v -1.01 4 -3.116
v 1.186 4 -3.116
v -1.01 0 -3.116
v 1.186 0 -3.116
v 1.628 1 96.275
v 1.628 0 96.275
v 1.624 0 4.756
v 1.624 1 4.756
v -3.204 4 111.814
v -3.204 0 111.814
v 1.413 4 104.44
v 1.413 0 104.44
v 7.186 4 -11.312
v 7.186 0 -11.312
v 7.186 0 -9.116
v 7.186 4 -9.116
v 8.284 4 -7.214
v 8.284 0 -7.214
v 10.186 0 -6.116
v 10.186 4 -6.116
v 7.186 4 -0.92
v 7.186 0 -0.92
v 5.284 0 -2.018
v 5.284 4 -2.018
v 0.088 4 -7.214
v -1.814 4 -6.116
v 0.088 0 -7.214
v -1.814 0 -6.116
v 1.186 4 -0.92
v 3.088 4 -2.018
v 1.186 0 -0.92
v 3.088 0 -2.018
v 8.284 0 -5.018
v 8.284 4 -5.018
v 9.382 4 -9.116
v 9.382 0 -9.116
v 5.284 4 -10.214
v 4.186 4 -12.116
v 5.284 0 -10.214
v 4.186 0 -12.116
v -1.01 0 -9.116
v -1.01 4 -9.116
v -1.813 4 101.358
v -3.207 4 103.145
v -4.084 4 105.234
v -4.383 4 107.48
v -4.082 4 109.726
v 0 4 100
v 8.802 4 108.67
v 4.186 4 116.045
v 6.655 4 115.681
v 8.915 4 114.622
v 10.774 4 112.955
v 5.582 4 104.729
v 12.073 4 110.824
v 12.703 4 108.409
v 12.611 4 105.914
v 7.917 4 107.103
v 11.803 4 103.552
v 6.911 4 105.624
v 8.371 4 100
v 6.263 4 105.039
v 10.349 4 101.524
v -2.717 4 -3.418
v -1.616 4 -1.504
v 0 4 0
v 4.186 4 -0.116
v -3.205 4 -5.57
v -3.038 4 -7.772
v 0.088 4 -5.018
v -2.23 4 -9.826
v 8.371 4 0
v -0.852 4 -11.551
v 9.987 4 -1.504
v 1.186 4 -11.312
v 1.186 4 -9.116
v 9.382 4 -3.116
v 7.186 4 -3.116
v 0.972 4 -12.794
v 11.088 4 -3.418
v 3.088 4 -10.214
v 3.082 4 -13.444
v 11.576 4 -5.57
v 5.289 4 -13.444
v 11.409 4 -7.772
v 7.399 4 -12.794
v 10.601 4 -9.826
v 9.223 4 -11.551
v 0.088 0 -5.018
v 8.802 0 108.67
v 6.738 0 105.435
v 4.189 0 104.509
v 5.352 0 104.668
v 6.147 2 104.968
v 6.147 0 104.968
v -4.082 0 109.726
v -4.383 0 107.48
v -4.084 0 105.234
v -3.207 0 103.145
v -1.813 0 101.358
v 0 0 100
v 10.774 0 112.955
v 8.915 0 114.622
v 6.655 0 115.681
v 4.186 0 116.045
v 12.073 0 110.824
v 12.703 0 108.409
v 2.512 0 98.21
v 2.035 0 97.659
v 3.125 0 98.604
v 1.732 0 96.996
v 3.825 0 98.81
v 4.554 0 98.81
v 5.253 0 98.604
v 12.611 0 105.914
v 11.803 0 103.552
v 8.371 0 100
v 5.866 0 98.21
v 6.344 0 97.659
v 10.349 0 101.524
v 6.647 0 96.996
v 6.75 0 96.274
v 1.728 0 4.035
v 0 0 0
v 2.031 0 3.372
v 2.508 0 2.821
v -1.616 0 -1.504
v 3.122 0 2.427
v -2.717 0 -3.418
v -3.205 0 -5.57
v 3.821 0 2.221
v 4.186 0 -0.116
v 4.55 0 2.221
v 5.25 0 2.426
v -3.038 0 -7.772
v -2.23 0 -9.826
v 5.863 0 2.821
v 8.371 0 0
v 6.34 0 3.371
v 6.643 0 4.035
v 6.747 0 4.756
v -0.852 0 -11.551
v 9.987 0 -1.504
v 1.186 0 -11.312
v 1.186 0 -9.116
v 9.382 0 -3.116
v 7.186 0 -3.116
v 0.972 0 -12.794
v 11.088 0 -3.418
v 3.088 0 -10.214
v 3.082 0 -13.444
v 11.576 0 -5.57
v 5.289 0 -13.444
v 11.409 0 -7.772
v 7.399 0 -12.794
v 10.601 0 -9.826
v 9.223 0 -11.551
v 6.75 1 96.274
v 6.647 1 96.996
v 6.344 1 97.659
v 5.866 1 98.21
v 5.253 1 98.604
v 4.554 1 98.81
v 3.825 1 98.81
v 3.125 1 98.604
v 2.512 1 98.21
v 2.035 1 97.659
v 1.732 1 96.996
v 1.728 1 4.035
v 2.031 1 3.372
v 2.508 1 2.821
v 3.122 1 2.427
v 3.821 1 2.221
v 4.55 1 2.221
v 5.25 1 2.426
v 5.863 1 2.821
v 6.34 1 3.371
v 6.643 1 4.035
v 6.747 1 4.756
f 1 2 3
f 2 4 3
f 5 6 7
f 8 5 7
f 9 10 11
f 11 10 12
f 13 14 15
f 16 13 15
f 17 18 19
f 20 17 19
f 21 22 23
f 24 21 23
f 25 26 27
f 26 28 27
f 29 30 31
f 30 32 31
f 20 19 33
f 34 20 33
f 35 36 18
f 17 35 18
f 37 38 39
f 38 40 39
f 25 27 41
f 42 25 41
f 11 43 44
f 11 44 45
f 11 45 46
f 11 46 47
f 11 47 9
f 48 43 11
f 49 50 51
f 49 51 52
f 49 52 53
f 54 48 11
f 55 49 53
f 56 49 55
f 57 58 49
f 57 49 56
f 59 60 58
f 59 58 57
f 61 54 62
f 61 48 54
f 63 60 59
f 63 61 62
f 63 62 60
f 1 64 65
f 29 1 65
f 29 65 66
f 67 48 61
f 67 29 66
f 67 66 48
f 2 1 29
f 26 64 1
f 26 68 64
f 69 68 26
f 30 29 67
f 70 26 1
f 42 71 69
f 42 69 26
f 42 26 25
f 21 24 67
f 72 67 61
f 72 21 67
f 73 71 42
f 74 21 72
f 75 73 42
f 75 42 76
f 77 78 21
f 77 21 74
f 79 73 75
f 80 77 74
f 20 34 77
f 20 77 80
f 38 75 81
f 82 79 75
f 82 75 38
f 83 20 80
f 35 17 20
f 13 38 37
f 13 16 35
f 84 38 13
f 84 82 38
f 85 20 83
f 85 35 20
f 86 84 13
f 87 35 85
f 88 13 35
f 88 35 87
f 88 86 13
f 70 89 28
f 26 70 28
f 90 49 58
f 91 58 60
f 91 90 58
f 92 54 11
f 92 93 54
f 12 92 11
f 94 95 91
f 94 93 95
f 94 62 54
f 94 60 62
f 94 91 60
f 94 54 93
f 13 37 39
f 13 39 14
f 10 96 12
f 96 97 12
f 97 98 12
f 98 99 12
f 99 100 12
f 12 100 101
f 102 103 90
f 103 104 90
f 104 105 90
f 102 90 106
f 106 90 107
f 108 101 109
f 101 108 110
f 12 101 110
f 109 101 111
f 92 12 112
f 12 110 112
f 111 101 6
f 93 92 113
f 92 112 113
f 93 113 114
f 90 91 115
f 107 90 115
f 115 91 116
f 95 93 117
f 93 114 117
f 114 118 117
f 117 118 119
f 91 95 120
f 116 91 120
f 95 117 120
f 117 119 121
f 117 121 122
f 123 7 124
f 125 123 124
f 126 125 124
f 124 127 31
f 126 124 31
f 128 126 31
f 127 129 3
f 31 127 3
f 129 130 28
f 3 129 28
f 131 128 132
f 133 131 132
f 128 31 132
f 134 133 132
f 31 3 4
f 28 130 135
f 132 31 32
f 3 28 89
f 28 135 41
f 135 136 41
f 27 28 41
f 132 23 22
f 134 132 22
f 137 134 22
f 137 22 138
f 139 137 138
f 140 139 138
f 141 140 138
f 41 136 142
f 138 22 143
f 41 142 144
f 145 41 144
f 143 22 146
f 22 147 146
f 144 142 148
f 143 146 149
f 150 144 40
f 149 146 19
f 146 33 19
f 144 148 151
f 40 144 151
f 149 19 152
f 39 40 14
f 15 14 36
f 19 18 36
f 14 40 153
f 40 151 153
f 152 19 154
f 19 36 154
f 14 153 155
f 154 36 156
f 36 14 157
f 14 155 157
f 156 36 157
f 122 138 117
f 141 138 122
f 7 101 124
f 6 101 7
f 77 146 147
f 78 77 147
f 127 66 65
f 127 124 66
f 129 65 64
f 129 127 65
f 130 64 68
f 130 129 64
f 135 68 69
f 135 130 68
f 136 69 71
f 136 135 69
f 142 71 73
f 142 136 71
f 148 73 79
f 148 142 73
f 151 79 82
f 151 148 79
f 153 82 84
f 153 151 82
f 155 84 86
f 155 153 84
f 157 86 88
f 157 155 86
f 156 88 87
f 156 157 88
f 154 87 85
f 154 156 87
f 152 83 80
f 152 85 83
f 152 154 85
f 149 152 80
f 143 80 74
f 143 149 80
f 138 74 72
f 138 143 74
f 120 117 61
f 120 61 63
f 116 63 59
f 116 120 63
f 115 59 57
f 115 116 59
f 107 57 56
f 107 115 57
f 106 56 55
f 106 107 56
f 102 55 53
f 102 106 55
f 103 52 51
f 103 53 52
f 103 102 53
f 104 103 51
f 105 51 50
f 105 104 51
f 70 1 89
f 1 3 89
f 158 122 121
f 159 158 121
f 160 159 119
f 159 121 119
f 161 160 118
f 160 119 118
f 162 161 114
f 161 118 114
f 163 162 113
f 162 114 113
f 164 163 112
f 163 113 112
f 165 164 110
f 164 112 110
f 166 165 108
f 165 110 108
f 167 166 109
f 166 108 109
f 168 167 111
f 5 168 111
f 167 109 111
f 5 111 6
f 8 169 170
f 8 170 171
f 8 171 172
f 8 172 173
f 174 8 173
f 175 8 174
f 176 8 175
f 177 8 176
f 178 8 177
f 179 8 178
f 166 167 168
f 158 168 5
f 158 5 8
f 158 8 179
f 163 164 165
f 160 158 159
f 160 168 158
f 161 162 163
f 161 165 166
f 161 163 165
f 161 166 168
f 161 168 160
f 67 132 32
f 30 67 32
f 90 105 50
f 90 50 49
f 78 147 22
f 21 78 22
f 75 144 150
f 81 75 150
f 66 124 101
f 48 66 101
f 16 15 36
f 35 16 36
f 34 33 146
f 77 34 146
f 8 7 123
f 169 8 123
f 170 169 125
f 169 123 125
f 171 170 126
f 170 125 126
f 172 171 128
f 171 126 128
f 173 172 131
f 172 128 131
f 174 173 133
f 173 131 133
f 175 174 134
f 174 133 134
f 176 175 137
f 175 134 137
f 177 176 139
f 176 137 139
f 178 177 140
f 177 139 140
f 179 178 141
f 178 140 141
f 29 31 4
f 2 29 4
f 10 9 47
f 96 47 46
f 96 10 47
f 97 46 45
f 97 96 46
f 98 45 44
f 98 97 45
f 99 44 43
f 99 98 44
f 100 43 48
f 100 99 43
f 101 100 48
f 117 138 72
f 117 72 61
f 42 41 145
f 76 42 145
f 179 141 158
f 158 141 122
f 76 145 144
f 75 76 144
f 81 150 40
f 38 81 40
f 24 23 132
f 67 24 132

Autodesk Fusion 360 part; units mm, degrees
sketch "Sketch1" plane through (0, 0, 0) normal (0, 1, 0) x (1, 0, 0)
  line L0 (0, 0) -> (0, -100)
  circle A0 centre (4.1857, -107.4765) radius 8.5685
  line L1 (4.1857, -1.3614) -> (4.1857, -1.2953)
  line L2 (8.3714, 0) -> (8.3714, -100)
  arc A1 (8.3714, 0) -> (0, 0) centre (4.1857, 6.1156) ccw
  dimension "d1" = 100
extrude "Extrude1" add sketch "Sketch1" along normal blind 5
sketch "Sketch2" plane through (0, 0, 0) normal (0, -1, 0) x (1, 0, 0)
  arc A0 (0, 0) -> (8.3714, 0) centre (4.1857, -6.1156) ccw
  line L0 (8.3714, 0) -> (8.3714, 100)
  arc A1 (8.3714, 100) -> (0, 100) centre (4.1857, 107.4765) ccw
  line L1 (0, 100) -> (0, 0)
  line L2 (3.0876, -2.0175) -> (1.1857, -0.9195)
  line L3 (7.1857, -0.9195) -> (5.2838, -2.0175)
  line L4 (0.0876, -5.0175) -> (-1.8143, -6.1156)
  line L5 (1.1857, -3.1156) -> (-1.0104, -3.1156)
  line L6 (4.1857, -0.1156) -> (3.0876, -2.0175)
  line L7 (0.0876, -7.2137) -> (-1.0104, -9.1156)
  line L8 (1.1857, -0.9195) -> (1.1857, -3.1156)
  line L9 (1.1857, -9.1156) -> (1.1857, -11.3118)
  line L10 (-1.0104, -3.1156) -> (0.0876, -5.0175)
  line L11 (3.0876, -10.2137) -> (4.1857, -12.1156)
  line L12 (-1.8143, -6.1156) -> (0.0876, -7.2137)
  line L13 (5.2838, -10.2137) -> (7.1857, -11.3118)
  line L14 (-1.0104, -9.1156) -> (1.1857, -9.1156)
  line L15 (7.1857, -9.1156) -> (9.3819, -9.1156)
  line L16 (1.1857, -11.3118) -> (3.0876, -10.2137)
  line L17 (8.2838, -7.2137) -> (10.1857, -6.1156)
  line L18 (4.1857, -12.1156) -> (5.2838, -10.2137)
  line L19 (8.2838, -5.0175) -> (9.3819, -3.1156)
  line L20 (7.1857, -11.3118) -> (7.1857, -9.1156)
  line L21 (7.1857, -3.1156) -> (7.1857, -0.9195)
  line L22 (9.3819, -9.1156) -> (8.2838, -7.2137)
  line L23 (5.2838, -2.0175) -> (4.1857, -0.1156)
  line L24 (10.1857, -6.1156) -> (8.2838, -5.0175)
  line L25 (9.3819, -3.1156) -> (7.1857, -3.1156)
  circle A2 centre (4.1857, 107.4765) radius 8.5685
  line L26 (-3.2037, 111.8142) -> (1.4127, 104.4395)
  line L27 (4.1857, 116.045) -> (8.8021, 108.6703)
  spline S0 degree 2 poles (8.8021, 108.6703) (6.4939, 104.4395) (1.4127, 104.4395) knots 0 0 0 0.931949 0.931949 0.931949 weights 1 3 1
  point P0 (4.1857, -6.1156)
  point P1 (4.1857, -6.1156)
  point P2 (4.1857, -6.1156)
  point P3 (4.1857, -6.1156)
  dimension "d5" = 6
  dimension "d6" = 6
  dimension "d7" = 6
  dimension "d8" = 6
extrude "Extrude2" cut sketch "Sketch2" along normal mid plane 18 contours A1 A2 L26 L27 S0 | L2 L3 L4 L5 L6 L7 L8 L9 L10 L11 L12 L13 L14 L15 L16 L17 L18 L19 L20 L21 L22 L23 L24 L25 picked at (4.1836, 108.8223)
sketch "Sketch3" plane through (0, 0, 0) normal (0, -1, 0) x (1, 0, 0)
  line L0 (1.4127, 104.4395) -> (-3.2037, 111.8142)
  arc A0 (-3.2037, 111.8142) -> (0, 100) centre (4.1857, 107.4765) ccw
  line L1 (0, 100) -> (0, 0)
  arc A1 (0, 0) -> (8.3714, 0) centre (4.1857, -6.1156) ccw
  line L2 (8.3714, 0) -> (8.3714, 100)
  arc A2 (8.3714, 100) -> (4.1857, 116.045) centre (4.1857, 107.4765) ccw
  line L3 (4.1857, 116.045) -> (8.8021, 108.6703)
  spline S0 degree 3 poles (8.8021, 108.6703) (7.7372, 106.7184) (7.1677, 105.8398) (6.3827, 105.0938) (6.1105, 104.9214) (5.074, 104.5294) (3.9773, 104.4395) (1.4127, 104.4395) knots 0 0 0 0 0.667054 0.667054 1.004366 1.004366 1.733719 1.733719 1.733719 1.733719
  line L4 (7.1857, -0.9195) -> (7.1857, -3.1156)
  line L5 (7.1857, -3.1156) -> (9.3819, -3.1156)
  line L6 (9.3819, -3.1156) -> (8.2838, -5.0175)
  line L7 (8.2838, -5.0175) -> (10.1857, -6.1156)
  line L8 (10.1857, -6.1156) -> (8.2838, -7.2137)
  line L9 (8.2838, -7.2137) -> (9.3819, -9.1156)
  line L10 (9.3819, -9.1156) -> (7.1857, -9.1156)
  line L11 (7.1857, -9.1156) -> (7.1857, -11.3118)
  line L12 (7.1857, -11.3118) -> (5.2838, -10.2137)
  line L13 (5.2838, -10.2137) -> (4.1857, -12.1156)
  line L14 (4.1857, -12.1156) -> (3.0876, -10.2137)
  line L15 (3.0876, -10.2137) -> (1.1857, -11.3118)
  line L16 (1.1857, -11.3118) -> (1.1857, -9.1156)
  line L17 (1.1857, -9.1156) -> (-1.0104, -9.1156)
  line L18 (-1.0104, -9.1156) -> (0.0876, -7.2137)
  line L19 (0.0876, -7.2137) -> (-1.8143, -6.1156)
  line L20 (-1.8143, -6.1156) -> (0.0876, -5.0175)
  line L21 (0.0876, -5.0175) -> (-1.0104, -3.1156)
  line L22 (-1.0104, -3.1156) -> (1.1857, -3.1156)
  line L23 (1.1857, -3.1156) -> (1.1857, -0.9195)
  line L24 (1.1857, -0.9195) -> (3.0876, -2.0175)
  line L25 (3.0876, -2.0175) -> (4.1857, -0.1156)
  line L26 (4.1857, -0.1156) -> (5.2838, -2.0175)
  line L27 (5.2838, -2.0175) -> (7.1857, -0.9195)
  line L28 (1.6279, 96.2747) -> (1.6245, 4.7564)
  arc A3 (1.6245, 4.7564) -> (6.7471, 4.7562) centre (4.1858, 4.7563) ccw
  line L29 (6.7471, 4.7562) -> (6.7504, 96.2745)
  arc A4 (6.7504, 96.2745) -> (1.6279, 96.2747) centre (4.1891, 96.2746) ccw
  line L30 (4.1892, 98.8359) -> (4.1857, 2.195) construction
extrude "Extrude3" cut sketch "Sketch3" against normal blind 1 contours L28 A3 L29 A4
extrude "Extrude4" cut 1 faces at (4.1857, 5, 66.6281) along direction (0, -1, 0) blind 1
